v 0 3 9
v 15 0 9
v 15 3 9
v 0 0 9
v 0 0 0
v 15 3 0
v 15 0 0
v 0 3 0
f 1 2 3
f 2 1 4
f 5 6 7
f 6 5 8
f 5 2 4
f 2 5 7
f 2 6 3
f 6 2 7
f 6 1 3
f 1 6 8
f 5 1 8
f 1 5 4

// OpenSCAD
// Generated by SolidPython 1.0.1 on 2020-07-29 00:46:55


cube(size = [15, 3, 9]);
/***********************************************
*********      SolidPython code:      **********
************************************************
 
# import packages: SolidPython
from solid import *
from solid.utils import *
from itertools import chain, combinations, permutations


class Resize:

    def __init__(self, scad_file):
        self.scad_file = scad_file
        #self.scad_file = import_scad(scad_file)
        # cone/cylinder param:
        self.r1 = 0
        self.r2 = 0
        self.h = 0
        # rectangular prism param:
        self.w = 0
        self.l = 0
        # ellipse param:
        self.r = 0

    # import OpenScad code (file name corresponds to shape)


    # classify shape + parameters
    def assign(self, param1, param2, param3):
        if self.scad_file == 'cone.scad':
            self.r1 = param1
            self.r2 = param2
            self.h = param3
        elif self.scad_file == 'cylinder.scad':
            self.r1 = param1
            self.r2 = param2
            self.h = param3
        elif self.scad_file == 'rectangularPrism.scad':
            self.h = param1
            self.l = param2
            self.w = param3
        else:
            self.r = param1
            self.h = param2

    # resize parameters
    def iterate(self):
        x = range(3, 20, 2)
        i = 1
        if self.scad_file == 'cone.scad':
            tempList = list(permutations(x, 2))
            for temp in tempList:
                param1 = temp[0]
                param2 = temp[1]
                filepath = 'produced_scad_files/' + 'cone' + str(param1) + '_' + str(param2) + '_' + '.scad'
                scad_render_to_file(cylinder(h=param1, r1=param2, r2=0), filepath)

        elif self.scad_file == 'cylinder.scad':
            tempList = list(permutations(x, 3))
            for temp in tempList:
                param1 = temp[0]
                param2 = temp[1]
                filepath = 'produced_scad_files/' + 'cylinder' + str(param1) + '_' + str(param2) + '_' + '.scad'
                scad_render_to_file(cylinder(h=param1, r1=param2, r2=param2), filepath)

        elif self.scad_file == 'rectangularPrism.scad':
            tempList = list(permutations(x, 3))
            for temp in tempList:
                param1 = temp[0]
                param2 = temp[1]
                param3 = temp[2]
                filepath = 'produced_scad_files/' + 'rectangularPrism' + str(param1) + '_' + str(param2) + '_' + str(
                    param3) + '.scad'
                scad_render_to_file(cube(size=(param1, param2, param3)), filepath)

        elif self.scad_file == 'ellipse.scad':
            tempList = list(permutations(x, 4))
            for temp in tempList:
                param1 = temp[0]
                param2 = temp[1]
                param3 = temp[2]
                param4 = temp[3]
                filepath = 'produced_scad_files/' + 'ellipse' + str(param1) + '_' + str(param2) + '_' + str(param3) + '_' + str(param4) + '.scad'
                scad_render_to_file(scale([param1, param2, param3])(sphere(r=param4)), filepath)

    def render_to_scadfile(self):
        scad_render_to_file(scad, 'example.scad') 
 
************************************************/
